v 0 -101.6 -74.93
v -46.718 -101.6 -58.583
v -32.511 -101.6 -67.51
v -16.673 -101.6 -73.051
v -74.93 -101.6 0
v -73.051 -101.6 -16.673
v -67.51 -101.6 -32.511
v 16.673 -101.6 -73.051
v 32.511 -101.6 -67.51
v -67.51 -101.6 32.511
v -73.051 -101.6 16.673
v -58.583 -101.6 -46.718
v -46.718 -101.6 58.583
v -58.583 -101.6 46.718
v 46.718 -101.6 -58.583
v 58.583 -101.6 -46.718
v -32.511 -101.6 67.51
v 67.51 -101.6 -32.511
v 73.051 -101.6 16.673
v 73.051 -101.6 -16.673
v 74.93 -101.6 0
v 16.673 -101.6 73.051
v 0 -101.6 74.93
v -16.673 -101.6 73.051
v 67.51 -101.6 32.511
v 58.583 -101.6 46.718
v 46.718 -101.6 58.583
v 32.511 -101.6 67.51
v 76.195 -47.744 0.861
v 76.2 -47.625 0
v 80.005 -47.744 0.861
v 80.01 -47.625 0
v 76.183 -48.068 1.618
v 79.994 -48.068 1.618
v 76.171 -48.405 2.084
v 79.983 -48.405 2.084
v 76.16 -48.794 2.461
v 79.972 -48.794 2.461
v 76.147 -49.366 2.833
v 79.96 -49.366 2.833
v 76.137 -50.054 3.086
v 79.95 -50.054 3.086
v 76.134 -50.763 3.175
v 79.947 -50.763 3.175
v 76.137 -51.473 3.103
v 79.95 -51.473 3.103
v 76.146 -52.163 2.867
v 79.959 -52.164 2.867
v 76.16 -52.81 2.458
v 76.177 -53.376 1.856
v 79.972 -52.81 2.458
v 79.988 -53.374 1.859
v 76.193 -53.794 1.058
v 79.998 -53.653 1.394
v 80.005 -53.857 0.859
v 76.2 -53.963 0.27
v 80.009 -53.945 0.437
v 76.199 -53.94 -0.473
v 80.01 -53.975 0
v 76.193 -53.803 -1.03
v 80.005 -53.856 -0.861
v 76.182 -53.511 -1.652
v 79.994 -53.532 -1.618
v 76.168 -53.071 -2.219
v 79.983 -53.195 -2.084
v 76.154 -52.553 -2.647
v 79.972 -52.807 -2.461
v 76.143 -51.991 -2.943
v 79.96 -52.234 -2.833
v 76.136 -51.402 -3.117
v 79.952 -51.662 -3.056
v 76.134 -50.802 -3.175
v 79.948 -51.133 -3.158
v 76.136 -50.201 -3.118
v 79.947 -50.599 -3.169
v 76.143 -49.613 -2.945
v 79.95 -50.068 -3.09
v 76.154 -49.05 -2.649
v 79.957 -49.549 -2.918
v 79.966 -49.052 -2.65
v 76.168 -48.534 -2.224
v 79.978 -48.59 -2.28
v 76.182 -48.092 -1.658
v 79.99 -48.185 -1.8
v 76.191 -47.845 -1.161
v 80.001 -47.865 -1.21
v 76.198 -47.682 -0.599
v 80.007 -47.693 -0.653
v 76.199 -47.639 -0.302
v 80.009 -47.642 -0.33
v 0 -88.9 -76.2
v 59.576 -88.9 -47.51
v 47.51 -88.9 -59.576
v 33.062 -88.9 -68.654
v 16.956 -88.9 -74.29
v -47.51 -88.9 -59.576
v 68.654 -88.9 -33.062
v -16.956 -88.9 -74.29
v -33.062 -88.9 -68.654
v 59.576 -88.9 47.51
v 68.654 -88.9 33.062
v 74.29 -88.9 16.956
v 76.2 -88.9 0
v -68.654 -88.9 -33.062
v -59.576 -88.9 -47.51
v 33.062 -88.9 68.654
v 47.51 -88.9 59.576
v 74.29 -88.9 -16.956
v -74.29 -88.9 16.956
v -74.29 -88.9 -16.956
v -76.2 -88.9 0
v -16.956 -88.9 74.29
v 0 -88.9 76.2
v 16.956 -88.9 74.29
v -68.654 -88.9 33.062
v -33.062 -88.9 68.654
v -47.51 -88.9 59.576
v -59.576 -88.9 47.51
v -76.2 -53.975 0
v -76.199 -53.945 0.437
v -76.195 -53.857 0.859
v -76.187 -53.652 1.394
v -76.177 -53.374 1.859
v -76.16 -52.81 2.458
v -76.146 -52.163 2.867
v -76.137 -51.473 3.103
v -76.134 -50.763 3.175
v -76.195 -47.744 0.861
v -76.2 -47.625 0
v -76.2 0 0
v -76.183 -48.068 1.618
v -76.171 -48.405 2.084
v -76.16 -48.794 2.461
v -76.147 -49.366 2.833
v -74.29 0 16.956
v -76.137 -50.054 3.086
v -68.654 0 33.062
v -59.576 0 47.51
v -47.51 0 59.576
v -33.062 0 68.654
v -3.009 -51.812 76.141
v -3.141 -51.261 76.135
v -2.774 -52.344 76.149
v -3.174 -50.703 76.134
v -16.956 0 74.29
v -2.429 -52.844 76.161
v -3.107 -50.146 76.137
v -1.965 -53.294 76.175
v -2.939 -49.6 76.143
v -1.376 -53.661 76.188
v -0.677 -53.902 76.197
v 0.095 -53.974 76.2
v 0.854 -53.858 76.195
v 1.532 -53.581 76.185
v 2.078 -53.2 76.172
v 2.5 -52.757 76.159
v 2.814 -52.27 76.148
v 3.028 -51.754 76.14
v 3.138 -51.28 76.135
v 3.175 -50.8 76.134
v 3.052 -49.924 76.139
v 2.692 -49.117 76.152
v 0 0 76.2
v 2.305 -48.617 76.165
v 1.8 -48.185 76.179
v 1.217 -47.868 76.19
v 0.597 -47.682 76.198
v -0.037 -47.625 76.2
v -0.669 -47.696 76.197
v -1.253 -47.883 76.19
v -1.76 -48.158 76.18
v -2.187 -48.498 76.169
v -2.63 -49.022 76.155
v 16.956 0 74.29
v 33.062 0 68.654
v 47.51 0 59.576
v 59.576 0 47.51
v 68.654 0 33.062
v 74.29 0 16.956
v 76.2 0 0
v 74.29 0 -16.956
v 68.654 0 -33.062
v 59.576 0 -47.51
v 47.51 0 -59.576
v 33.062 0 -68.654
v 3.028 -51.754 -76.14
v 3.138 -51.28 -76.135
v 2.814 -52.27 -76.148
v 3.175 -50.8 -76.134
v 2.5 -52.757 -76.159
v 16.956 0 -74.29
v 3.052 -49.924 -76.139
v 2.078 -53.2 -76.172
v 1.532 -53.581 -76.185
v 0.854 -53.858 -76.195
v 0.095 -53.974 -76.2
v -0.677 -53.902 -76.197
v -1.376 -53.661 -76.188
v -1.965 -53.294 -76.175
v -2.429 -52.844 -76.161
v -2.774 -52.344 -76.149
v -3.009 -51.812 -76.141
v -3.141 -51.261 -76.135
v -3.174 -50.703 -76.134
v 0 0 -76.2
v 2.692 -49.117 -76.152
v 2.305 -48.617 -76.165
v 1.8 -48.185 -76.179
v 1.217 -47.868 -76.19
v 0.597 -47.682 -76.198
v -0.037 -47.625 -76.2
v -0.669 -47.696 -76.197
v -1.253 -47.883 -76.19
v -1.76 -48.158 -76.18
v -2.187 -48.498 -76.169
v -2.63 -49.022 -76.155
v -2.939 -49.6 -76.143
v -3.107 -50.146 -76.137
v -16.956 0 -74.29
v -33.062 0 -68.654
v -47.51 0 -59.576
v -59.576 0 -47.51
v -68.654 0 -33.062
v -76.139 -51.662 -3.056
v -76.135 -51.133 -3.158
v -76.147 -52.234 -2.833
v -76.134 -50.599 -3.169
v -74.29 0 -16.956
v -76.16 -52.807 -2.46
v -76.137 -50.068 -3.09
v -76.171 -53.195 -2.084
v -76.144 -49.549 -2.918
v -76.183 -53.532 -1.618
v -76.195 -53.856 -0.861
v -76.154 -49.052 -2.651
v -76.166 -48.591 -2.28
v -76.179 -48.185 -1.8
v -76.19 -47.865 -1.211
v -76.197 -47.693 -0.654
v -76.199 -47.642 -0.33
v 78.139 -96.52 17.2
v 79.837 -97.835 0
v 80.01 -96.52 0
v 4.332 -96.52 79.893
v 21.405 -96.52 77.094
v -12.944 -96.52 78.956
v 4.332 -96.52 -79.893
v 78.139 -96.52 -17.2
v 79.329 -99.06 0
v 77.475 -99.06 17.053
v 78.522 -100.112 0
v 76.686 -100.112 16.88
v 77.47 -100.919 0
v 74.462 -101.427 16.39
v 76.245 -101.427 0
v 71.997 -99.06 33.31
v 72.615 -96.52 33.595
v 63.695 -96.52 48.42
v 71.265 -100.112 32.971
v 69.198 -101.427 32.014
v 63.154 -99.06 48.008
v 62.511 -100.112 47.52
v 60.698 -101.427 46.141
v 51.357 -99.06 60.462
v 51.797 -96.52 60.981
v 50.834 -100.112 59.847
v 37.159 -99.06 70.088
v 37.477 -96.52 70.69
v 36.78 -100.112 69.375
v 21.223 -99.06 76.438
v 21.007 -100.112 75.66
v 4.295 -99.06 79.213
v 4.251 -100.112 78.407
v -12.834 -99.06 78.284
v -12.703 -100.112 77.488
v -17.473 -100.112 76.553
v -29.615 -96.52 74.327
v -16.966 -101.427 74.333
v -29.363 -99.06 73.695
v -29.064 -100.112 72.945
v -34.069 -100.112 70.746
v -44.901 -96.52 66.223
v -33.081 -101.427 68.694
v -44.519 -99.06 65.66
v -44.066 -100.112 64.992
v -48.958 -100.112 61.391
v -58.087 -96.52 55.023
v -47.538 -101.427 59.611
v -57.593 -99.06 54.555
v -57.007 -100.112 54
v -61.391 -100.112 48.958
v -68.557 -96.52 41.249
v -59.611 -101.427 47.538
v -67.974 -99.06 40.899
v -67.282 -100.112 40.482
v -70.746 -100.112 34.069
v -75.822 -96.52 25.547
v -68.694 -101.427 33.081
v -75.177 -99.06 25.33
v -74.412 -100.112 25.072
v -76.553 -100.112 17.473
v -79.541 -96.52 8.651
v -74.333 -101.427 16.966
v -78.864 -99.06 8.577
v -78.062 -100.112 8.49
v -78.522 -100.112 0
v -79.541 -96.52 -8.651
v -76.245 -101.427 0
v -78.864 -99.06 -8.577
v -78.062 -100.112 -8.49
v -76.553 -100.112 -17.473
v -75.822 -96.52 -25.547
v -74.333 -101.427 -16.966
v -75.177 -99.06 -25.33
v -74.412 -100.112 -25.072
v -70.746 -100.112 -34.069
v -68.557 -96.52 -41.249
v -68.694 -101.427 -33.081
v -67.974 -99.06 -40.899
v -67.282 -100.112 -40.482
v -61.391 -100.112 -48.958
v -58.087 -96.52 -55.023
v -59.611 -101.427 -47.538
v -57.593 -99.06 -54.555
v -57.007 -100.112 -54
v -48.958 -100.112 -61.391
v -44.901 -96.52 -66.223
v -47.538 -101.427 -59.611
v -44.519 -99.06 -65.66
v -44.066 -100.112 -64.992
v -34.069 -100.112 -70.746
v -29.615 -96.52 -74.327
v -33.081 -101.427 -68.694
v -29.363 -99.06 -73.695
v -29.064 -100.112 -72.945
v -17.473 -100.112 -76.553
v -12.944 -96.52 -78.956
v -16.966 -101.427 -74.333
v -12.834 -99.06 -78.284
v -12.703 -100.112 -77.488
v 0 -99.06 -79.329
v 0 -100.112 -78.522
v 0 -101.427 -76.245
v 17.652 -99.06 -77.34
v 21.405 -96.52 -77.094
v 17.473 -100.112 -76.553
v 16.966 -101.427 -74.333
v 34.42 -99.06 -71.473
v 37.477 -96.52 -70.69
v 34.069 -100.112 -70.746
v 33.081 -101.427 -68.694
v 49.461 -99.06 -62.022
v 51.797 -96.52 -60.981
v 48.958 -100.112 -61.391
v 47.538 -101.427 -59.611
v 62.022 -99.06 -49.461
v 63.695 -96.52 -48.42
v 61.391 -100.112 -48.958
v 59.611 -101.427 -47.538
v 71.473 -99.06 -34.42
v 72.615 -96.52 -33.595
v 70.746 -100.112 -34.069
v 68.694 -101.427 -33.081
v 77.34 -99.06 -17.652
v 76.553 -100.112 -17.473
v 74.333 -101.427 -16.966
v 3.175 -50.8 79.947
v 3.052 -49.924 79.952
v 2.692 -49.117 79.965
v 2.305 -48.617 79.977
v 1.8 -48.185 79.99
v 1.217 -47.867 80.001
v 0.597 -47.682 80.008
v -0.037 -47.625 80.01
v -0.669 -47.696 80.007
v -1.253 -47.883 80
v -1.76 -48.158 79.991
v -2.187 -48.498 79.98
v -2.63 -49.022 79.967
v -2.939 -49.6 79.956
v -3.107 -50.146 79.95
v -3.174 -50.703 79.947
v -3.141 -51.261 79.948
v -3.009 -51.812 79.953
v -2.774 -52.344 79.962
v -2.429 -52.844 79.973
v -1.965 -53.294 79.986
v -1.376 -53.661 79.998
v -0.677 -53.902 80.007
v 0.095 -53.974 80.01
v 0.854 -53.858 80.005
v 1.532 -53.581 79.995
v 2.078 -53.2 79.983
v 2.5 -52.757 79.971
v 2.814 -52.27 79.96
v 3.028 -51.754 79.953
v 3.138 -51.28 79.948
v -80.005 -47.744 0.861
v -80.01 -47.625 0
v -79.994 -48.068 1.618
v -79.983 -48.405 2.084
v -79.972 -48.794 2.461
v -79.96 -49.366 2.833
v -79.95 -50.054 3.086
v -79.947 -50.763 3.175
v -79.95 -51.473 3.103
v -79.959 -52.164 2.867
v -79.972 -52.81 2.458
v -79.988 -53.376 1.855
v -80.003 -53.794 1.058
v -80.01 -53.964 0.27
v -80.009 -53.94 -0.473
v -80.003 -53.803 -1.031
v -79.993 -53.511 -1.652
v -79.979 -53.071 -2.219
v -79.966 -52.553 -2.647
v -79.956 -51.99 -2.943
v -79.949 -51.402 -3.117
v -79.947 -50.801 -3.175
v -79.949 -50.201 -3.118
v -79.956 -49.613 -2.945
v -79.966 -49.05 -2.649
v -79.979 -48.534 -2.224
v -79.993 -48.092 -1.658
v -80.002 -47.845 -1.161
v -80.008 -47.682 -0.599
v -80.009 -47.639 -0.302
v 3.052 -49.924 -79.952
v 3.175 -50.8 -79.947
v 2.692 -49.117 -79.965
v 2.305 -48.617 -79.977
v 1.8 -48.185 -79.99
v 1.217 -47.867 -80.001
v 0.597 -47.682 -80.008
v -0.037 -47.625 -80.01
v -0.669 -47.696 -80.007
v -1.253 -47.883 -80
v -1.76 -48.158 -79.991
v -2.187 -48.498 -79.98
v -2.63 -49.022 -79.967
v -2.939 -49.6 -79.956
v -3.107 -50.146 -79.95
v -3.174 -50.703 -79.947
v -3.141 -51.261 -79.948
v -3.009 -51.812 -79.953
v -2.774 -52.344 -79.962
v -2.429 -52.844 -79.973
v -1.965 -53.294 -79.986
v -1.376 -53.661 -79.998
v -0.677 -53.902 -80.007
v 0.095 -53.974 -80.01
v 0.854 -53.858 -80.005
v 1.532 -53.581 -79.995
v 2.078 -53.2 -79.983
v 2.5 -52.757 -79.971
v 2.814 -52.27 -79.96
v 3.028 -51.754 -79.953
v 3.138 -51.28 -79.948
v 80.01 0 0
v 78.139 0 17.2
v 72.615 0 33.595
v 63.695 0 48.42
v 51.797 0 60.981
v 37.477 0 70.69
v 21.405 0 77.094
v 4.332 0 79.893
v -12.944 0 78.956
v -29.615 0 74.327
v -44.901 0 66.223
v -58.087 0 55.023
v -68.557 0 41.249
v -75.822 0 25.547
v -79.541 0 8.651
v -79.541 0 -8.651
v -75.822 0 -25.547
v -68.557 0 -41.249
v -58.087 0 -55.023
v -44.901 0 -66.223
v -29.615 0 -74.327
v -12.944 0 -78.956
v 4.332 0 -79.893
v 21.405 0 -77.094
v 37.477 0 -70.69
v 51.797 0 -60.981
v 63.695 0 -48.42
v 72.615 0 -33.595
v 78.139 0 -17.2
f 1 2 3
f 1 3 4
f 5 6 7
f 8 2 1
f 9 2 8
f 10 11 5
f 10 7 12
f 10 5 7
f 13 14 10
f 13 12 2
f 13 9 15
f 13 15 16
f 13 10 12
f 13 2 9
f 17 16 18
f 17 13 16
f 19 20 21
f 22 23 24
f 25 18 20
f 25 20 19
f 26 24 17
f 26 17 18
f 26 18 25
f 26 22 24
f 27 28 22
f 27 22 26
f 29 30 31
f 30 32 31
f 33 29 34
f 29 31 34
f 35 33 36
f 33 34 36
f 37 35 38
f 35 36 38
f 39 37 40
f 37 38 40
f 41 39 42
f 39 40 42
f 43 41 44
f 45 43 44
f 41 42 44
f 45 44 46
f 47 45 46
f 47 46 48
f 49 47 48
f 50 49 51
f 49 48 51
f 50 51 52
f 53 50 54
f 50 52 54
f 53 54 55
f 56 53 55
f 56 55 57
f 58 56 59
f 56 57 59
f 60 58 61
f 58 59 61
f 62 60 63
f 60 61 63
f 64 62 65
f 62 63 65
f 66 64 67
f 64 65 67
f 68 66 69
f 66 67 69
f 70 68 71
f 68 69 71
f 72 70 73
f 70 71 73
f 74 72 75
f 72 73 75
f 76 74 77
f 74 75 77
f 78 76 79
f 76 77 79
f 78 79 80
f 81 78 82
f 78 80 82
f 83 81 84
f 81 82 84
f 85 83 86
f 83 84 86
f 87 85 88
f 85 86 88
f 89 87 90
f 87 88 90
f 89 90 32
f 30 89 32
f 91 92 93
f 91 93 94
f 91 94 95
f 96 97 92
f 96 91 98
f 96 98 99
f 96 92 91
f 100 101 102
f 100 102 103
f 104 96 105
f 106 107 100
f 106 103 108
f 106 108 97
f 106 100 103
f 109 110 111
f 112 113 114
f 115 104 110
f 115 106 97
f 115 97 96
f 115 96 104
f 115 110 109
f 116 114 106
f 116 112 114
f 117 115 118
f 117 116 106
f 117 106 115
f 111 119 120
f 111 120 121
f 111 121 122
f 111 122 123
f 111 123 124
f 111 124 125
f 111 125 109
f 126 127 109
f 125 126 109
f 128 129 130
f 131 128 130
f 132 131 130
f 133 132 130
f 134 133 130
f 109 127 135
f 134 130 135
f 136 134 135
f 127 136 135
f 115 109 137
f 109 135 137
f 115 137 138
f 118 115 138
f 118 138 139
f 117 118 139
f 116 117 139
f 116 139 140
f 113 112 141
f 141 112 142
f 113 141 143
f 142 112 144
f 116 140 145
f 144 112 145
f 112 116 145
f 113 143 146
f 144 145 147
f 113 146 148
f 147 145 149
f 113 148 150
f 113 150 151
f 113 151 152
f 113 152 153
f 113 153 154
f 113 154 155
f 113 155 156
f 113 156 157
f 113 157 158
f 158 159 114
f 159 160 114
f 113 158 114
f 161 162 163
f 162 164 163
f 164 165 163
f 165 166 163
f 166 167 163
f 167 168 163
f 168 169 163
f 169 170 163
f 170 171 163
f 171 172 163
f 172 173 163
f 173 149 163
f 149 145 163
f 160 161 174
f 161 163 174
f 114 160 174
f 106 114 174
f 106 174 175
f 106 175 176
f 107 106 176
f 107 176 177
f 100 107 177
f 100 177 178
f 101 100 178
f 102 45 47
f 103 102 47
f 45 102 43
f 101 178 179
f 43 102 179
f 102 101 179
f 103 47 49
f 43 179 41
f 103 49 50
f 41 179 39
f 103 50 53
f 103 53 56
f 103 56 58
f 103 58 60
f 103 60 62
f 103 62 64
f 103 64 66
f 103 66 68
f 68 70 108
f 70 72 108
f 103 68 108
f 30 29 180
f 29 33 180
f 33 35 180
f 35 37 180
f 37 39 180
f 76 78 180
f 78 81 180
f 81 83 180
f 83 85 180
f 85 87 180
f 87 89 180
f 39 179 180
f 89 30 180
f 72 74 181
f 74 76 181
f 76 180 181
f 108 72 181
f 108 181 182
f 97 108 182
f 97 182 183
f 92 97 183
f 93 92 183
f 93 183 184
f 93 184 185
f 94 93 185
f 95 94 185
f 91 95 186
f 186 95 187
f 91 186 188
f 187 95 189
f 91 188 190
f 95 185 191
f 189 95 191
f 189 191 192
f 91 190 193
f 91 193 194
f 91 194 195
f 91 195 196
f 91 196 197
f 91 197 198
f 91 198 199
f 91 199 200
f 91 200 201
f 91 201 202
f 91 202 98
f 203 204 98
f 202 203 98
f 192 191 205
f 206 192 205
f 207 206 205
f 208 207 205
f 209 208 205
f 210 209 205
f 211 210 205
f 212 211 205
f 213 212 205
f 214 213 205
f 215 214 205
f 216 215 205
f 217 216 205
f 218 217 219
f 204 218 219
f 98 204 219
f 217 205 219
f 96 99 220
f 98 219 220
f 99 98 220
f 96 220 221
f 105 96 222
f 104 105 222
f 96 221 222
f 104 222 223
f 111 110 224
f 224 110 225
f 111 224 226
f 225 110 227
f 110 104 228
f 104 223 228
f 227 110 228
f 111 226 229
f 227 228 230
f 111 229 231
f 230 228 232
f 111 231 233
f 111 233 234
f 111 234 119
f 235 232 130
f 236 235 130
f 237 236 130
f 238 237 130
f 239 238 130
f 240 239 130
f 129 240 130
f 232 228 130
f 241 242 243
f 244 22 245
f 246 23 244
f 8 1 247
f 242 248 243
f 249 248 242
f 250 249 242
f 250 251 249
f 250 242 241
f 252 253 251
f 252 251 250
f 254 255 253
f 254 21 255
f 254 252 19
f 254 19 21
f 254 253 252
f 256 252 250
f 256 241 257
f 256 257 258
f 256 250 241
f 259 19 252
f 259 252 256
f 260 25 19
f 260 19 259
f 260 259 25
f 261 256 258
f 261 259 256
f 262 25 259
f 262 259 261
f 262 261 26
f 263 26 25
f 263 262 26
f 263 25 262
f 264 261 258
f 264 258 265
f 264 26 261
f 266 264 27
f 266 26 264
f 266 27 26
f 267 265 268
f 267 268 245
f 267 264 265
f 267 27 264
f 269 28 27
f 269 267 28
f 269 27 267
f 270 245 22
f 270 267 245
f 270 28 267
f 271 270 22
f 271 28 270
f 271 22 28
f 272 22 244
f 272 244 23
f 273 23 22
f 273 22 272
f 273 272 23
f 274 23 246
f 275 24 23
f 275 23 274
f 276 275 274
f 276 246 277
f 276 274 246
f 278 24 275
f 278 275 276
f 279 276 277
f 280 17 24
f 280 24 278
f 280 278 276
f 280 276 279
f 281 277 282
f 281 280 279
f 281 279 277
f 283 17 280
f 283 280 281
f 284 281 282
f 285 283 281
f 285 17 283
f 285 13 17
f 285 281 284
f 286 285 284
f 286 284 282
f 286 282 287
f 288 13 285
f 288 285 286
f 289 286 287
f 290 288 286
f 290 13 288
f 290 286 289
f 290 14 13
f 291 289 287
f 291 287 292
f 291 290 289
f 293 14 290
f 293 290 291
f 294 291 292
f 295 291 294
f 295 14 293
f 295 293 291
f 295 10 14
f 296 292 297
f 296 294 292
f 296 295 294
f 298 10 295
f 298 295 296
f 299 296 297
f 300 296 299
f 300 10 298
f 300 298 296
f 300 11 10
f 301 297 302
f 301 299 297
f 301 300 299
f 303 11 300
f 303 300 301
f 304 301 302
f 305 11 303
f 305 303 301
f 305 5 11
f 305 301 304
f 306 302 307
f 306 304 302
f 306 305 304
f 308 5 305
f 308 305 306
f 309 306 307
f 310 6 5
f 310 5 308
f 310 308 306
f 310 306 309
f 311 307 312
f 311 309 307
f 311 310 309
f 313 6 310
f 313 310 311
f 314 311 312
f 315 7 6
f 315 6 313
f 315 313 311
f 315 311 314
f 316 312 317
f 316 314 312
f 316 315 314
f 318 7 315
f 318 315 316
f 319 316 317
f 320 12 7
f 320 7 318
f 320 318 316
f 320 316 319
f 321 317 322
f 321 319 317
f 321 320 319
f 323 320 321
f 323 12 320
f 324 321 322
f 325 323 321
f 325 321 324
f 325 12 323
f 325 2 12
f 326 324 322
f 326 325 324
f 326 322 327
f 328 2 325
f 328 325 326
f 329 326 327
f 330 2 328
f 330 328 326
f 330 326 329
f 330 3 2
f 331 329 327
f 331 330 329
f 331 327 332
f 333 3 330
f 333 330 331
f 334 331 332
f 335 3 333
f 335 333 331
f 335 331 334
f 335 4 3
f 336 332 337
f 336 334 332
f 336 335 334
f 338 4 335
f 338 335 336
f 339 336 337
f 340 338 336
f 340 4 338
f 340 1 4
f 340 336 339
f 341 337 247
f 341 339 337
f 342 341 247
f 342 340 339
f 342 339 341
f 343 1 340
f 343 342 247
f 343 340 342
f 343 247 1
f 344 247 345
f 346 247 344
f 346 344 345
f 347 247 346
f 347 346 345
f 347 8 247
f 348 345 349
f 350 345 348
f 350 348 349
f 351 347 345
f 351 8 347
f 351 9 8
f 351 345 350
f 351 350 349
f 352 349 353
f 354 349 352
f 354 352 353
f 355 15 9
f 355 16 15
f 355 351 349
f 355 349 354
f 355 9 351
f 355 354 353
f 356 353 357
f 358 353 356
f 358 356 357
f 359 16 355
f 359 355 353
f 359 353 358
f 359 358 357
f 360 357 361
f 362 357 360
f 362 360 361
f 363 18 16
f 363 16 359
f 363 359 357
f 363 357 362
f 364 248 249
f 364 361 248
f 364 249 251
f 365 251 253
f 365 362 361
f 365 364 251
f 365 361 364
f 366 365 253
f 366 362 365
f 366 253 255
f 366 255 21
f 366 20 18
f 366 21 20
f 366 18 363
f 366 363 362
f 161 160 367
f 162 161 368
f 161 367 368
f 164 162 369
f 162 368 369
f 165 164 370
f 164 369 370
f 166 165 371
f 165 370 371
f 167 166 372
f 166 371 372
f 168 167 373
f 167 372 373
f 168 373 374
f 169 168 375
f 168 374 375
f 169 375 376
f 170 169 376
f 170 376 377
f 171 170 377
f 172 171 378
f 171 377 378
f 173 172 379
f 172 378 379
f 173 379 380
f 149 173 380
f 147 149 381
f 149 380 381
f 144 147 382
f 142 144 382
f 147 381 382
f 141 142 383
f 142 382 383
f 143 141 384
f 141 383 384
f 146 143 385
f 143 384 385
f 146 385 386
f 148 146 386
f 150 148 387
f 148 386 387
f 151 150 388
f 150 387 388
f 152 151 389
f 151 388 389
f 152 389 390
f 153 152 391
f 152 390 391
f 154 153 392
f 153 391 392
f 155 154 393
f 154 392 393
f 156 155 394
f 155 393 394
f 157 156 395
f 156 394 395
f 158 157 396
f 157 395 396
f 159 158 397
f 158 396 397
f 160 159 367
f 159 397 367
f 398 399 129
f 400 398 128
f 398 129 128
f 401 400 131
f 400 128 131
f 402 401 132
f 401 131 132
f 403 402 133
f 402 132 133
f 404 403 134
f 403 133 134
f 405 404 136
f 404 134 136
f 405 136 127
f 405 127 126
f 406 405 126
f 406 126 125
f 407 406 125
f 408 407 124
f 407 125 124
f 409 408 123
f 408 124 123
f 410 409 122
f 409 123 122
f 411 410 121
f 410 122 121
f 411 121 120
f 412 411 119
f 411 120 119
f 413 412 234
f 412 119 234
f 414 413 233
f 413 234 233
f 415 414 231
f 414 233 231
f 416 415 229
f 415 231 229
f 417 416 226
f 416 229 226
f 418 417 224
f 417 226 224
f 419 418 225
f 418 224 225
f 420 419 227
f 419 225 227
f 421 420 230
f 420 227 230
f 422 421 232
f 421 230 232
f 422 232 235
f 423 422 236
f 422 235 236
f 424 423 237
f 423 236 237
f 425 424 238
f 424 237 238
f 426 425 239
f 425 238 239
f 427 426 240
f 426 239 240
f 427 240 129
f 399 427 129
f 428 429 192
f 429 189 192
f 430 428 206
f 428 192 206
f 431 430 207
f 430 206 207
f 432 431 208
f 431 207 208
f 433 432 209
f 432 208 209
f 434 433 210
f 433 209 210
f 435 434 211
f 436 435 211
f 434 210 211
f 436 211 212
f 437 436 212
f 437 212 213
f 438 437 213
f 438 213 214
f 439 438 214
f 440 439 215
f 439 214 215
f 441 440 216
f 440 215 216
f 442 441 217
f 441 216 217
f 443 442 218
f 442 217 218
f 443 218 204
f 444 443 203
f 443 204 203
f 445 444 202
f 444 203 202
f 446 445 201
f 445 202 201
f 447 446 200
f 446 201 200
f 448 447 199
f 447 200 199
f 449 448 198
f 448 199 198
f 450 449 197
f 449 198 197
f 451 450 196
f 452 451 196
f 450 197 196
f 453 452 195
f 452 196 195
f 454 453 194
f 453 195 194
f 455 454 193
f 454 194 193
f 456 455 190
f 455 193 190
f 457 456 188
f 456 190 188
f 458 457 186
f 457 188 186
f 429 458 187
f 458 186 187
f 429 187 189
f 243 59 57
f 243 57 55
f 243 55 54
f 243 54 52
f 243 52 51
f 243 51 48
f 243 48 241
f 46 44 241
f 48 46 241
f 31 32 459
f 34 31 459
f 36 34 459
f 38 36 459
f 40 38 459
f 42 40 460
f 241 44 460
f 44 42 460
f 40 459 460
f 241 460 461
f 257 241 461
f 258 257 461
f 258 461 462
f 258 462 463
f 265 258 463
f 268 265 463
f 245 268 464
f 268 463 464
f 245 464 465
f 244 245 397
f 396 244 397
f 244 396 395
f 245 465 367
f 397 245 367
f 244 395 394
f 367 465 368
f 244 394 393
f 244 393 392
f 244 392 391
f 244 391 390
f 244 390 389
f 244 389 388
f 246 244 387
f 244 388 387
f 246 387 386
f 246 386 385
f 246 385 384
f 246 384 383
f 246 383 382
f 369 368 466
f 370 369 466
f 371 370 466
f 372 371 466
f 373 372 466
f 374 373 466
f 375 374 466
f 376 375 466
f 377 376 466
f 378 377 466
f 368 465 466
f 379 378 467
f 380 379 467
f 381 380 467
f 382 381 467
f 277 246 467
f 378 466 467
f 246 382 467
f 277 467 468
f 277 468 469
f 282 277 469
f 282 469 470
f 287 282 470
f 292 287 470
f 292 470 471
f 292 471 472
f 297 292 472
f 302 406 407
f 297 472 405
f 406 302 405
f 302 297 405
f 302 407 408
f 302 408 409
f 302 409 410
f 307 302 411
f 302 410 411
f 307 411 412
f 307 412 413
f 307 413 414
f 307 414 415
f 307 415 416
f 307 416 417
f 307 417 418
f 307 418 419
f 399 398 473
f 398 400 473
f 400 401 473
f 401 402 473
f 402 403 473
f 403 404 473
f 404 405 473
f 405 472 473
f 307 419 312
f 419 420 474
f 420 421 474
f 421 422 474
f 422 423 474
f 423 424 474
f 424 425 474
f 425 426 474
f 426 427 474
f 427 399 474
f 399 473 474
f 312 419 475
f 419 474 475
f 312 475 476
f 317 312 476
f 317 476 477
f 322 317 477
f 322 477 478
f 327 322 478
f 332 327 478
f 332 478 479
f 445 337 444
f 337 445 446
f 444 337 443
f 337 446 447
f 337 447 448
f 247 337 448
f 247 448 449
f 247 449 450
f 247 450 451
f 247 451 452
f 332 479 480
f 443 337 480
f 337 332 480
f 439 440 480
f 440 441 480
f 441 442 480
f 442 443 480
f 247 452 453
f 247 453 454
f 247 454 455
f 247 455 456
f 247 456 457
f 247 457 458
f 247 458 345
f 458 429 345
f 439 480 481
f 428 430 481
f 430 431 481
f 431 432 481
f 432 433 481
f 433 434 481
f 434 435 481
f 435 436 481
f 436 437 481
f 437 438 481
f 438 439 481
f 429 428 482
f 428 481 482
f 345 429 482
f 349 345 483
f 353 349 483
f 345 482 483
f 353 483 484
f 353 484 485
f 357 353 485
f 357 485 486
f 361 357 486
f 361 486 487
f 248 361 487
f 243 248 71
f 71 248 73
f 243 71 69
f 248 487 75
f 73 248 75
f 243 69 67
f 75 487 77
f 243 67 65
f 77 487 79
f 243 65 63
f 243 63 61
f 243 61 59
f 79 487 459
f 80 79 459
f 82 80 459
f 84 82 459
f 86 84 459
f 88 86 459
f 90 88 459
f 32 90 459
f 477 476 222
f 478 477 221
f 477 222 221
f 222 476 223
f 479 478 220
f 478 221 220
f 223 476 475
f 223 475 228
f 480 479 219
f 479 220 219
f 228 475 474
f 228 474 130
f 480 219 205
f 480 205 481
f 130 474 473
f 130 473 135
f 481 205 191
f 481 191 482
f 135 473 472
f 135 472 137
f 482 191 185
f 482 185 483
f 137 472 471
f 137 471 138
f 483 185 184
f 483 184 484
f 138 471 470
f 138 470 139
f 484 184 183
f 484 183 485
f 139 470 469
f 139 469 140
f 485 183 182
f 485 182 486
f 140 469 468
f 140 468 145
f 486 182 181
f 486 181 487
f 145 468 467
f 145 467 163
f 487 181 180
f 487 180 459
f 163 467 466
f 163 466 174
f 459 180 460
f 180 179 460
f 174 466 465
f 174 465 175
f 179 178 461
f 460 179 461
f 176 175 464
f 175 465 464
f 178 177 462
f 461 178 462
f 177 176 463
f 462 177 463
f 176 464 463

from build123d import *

# Parameters (mm, degrees)
F0_R     = 80.01
F1_DEPTH = 101.6
F2_R     = 76.2
F3_DEPTH = 88.9
F4_R     = 5.08
F5_R     = 3.175
F6_DEPTH = 127
F7_R     = 3.175
F8_DEPTH = 127


with BuildPart() as f1:
    # F0 (on Front) → F1 (new body)
    with BuildSketch(Plane.XZ):
        Circle(F0_R)
    extrude(amount=F1_DEPTH)

    # F2 (on face) → F3 (cut)
    with BuildSketch(Plane(origin=(0, 0, 0), x_dir=(-1, 0, 0), z_dir=(0, 1, 0))):
        Circle(F2_R)
    extrude(amount=-F3_DEPTH, mode=Mode.SUBTRACT)

    # F4
    f4_edges = [f1.edges().sort_by_distance(p)[0] for p in [
        (-80.01, -101.6, 0),
    ]]
    fillet(f4_edges, radius=F4_R)

    # F5 (on Top) → F6 (cut, symmetric)
    with BuildSketch(Plane.XY):
        with Locations((0, -50.8)):
            Circle(F5_R)
    extrude(amount=F6_DEPTH, both=True, mode=Mode.SUBTRACT)

    # F7 (on Right) → F8 (cut, symmetric)
    with BuildSketch(Plane.YZ):
        with Locations((-50.8, 0)):
            Circle(F7_R)
    extrude(amount=F8_DEPTH, both=True, mode=Mode.SUBTRACT)


solid = f1.part
